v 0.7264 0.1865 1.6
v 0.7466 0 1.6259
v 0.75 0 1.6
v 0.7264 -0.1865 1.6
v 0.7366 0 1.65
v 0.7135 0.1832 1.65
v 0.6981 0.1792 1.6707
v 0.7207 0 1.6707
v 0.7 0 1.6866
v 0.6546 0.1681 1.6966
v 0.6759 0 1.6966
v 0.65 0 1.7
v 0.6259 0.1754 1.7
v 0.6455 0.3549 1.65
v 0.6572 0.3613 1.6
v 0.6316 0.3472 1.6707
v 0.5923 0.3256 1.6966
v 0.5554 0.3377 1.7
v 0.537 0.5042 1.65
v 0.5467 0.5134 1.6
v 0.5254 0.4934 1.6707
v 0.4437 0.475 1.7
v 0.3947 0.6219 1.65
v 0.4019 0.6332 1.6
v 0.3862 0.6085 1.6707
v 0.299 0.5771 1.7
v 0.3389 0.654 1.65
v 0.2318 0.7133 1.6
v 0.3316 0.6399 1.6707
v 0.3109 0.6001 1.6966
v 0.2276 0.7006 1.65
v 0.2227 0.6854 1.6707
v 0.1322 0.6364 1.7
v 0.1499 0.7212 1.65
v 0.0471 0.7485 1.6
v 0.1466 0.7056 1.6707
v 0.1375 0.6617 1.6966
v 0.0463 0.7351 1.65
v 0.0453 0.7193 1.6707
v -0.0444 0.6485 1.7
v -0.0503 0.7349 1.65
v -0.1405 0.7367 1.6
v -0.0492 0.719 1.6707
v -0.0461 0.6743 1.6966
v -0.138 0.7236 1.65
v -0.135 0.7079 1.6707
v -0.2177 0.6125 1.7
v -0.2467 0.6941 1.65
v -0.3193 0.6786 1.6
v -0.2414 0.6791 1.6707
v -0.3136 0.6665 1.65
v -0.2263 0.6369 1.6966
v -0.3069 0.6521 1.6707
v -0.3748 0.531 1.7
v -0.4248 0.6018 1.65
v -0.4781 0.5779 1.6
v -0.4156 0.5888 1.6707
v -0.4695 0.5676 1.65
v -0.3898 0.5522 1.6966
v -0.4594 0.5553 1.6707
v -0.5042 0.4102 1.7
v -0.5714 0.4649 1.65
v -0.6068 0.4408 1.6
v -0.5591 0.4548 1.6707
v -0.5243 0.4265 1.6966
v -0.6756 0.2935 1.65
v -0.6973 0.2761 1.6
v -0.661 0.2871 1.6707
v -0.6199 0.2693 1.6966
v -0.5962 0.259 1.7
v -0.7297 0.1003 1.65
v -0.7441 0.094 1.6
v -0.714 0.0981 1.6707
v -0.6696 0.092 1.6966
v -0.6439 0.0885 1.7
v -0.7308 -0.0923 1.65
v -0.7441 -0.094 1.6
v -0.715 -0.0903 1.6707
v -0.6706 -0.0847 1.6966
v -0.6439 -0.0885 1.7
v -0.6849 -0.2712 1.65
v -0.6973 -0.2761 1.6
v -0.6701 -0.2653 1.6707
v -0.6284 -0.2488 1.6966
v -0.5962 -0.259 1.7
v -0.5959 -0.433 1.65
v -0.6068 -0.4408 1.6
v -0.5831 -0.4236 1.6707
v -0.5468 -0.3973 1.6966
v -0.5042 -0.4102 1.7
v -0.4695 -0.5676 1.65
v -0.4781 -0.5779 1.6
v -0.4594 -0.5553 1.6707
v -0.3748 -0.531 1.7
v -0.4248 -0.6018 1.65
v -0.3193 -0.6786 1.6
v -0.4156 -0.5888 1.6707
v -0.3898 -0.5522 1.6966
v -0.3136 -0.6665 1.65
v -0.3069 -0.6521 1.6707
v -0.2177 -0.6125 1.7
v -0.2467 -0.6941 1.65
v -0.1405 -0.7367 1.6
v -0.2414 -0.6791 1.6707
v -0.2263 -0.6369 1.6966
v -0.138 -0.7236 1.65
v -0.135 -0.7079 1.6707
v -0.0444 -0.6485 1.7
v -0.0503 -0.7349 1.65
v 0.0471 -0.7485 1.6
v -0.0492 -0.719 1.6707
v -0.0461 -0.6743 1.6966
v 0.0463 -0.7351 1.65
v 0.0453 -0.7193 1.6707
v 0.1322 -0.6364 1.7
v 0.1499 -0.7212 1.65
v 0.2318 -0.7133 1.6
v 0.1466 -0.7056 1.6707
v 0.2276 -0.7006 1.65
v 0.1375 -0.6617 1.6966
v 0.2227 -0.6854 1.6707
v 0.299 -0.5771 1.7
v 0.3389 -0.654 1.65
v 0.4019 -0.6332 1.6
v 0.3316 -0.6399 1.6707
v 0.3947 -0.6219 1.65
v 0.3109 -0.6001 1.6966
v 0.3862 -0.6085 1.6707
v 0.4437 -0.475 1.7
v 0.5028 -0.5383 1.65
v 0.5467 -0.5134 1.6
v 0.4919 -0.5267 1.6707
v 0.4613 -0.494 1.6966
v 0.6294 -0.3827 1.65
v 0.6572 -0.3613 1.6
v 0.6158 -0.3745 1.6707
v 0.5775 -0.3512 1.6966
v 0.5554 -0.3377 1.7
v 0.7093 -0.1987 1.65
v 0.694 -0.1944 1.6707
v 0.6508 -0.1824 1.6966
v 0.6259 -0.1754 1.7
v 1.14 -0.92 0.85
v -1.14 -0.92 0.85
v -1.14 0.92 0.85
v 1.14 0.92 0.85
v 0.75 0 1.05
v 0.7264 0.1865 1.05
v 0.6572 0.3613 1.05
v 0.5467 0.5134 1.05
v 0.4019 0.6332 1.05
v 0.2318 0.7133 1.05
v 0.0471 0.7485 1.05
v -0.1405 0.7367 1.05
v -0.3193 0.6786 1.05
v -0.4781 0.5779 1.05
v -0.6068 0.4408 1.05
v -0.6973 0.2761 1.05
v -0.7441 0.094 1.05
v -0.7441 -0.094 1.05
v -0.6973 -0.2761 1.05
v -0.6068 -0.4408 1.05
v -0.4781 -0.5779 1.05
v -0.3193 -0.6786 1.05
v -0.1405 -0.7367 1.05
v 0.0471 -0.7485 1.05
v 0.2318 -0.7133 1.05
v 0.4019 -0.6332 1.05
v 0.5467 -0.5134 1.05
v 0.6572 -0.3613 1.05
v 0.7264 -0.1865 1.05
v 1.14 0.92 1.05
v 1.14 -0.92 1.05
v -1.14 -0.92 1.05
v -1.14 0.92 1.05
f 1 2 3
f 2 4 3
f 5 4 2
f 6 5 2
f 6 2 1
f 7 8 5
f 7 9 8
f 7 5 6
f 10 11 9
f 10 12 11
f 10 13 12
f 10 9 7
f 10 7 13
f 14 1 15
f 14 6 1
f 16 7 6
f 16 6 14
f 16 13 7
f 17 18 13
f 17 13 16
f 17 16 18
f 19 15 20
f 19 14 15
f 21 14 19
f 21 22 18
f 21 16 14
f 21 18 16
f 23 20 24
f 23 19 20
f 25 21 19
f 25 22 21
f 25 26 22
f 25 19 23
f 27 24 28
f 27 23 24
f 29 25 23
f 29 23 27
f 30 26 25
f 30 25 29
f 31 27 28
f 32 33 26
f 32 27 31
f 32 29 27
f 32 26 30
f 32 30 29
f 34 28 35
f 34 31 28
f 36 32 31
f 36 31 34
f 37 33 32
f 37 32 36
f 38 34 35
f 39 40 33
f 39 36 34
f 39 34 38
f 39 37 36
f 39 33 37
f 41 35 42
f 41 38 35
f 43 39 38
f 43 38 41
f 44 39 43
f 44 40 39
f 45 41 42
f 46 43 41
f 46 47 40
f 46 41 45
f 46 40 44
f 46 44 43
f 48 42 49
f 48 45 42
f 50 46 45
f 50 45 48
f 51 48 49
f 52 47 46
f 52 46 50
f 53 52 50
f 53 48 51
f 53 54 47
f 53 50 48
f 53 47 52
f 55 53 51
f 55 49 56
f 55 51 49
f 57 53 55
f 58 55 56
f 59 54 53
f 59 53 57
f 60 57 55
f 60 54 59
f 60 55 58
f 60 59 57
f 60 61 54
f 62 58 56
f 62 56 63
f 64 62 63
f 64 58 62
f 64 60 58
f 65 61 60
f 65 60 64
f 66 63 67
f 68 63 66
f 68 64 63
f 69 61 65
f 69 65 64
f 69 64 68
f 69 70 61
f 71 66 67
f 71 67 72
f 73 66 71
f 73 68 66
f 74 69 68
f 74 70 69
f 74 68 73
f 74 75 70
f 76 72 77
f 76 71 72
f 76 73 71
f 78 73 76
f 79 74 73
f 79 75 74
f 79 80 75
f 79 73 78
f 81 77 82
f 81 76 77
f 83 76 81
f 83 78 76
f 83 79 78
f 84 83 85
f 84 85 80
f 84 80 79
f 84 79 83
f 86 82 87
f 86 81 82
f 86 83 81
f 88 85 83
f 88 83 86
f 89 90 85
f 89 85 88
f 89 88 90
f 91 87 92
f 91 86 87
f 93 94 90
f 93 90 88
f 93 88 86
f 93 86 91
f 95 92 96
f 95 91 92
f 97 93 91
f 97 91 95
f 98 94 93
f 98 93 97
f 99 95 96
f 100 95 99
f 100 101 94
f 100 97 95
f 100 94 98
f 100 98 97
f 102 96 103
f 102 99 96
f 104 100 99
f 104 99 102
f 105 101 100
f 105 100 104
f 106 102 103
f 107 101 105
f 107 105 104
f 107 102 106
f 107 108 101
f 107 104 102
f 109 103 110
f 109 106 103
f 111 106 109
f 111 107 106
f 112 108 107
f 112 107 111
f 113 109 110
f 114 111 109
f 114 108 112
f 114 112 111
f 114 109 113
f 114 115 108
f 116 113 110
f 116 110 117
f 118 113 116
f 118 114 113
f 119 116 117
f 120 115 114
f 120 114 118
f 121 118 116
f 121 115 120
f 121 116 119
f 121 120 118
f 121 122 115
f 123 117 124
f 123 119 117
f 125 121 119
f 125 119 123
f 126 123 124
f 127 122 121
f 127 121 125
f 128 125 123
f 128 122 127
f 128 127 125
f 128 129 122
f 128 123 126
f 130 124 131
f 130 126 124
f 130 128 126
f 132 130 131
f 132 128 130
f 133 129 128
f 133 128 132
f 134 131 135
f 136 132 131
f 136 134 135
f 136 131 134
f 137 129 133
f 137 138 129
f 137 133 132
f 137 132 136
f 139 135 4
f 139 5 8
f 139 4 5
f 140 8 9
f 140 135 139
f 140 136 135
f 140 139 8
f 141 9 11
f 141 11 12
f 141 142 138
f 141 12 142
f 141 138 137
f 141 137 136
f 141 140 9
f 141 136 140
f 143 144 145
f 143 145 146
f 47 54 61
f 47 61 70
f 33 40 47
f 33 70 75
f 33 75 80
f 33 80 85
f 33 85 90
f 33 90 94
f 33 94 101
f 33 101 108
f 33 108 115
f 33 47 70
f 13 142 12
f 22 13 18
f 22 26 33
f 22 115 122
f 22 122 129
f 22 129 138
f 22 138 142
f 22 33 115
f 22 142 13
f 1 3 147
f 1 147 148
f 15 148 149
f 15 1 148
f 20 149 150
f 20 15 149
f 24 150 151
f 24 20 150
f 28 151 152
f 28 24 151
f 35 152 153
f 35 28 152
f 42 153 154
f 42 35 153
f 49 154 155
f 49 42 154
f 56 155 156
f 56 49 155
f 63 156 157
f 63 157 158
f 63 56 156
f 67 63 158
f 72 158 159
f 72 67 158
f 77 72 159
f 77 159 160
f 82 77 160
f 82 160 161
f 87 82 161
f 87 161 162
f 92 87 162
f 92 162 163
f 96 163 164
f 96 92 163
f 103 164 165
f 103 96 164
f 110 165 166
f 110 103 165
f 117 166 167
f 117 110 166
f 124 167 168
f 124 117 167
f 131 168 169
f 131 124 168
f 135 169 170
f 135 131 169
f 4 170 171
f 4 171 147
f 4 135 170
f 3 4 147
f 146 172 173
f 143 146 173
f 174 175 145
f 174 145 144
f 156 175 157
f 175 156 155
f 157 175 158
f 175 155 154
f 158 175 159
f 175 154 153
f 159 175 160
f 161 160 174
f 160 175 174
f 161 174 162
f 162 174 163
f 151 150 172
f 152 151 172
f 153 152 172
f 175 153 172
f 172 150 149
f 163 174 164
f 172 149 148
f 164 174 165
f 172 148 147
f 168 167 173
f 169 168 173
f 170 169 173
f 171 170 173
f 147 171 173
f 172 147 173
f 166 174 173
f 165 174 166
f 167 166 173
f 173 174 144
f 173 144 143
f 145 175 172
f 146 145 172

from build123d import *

# Parameters (mm, degrees)
SKETCH010_R  = 0.75
PAD007_DEPTH = 0.65
SKETCH011_W  = 2.28
SKETCH011_H  = 1.84
PAD008_DEPTH = 0.2
FILLET001_R  = 0.1


with BuildPart() as part:
    # Sketch010 (on DatumPlane) → Pad007 (new body)
    with BuildSketch(Plane.XY.offset(1.7)):
        Circle(SKETCH010_R)
    extrude(amount=-PAD007_DEPTH)

    # Sketch011 (on Face3 of Pad007) → Pad008 (join)
    with BuildSketch(Plane(origin=(0, 0, 1.05), x_dir=(1, 0, 0), z_dir=(0, 0, -1))):
        Rectangle(SKETCH011_W, SKETCH011_H)
    extrude(amount=PAD008_DEPTH)

    # Fillet001
    fillet001_edges = [part.edges().sort_by_distance(p)[0] for p in [
        (-0.75, 0, 1.7),
    ]]
    fillet(fillet001_edges, radius=FILLET001_R)


solid = part.part
